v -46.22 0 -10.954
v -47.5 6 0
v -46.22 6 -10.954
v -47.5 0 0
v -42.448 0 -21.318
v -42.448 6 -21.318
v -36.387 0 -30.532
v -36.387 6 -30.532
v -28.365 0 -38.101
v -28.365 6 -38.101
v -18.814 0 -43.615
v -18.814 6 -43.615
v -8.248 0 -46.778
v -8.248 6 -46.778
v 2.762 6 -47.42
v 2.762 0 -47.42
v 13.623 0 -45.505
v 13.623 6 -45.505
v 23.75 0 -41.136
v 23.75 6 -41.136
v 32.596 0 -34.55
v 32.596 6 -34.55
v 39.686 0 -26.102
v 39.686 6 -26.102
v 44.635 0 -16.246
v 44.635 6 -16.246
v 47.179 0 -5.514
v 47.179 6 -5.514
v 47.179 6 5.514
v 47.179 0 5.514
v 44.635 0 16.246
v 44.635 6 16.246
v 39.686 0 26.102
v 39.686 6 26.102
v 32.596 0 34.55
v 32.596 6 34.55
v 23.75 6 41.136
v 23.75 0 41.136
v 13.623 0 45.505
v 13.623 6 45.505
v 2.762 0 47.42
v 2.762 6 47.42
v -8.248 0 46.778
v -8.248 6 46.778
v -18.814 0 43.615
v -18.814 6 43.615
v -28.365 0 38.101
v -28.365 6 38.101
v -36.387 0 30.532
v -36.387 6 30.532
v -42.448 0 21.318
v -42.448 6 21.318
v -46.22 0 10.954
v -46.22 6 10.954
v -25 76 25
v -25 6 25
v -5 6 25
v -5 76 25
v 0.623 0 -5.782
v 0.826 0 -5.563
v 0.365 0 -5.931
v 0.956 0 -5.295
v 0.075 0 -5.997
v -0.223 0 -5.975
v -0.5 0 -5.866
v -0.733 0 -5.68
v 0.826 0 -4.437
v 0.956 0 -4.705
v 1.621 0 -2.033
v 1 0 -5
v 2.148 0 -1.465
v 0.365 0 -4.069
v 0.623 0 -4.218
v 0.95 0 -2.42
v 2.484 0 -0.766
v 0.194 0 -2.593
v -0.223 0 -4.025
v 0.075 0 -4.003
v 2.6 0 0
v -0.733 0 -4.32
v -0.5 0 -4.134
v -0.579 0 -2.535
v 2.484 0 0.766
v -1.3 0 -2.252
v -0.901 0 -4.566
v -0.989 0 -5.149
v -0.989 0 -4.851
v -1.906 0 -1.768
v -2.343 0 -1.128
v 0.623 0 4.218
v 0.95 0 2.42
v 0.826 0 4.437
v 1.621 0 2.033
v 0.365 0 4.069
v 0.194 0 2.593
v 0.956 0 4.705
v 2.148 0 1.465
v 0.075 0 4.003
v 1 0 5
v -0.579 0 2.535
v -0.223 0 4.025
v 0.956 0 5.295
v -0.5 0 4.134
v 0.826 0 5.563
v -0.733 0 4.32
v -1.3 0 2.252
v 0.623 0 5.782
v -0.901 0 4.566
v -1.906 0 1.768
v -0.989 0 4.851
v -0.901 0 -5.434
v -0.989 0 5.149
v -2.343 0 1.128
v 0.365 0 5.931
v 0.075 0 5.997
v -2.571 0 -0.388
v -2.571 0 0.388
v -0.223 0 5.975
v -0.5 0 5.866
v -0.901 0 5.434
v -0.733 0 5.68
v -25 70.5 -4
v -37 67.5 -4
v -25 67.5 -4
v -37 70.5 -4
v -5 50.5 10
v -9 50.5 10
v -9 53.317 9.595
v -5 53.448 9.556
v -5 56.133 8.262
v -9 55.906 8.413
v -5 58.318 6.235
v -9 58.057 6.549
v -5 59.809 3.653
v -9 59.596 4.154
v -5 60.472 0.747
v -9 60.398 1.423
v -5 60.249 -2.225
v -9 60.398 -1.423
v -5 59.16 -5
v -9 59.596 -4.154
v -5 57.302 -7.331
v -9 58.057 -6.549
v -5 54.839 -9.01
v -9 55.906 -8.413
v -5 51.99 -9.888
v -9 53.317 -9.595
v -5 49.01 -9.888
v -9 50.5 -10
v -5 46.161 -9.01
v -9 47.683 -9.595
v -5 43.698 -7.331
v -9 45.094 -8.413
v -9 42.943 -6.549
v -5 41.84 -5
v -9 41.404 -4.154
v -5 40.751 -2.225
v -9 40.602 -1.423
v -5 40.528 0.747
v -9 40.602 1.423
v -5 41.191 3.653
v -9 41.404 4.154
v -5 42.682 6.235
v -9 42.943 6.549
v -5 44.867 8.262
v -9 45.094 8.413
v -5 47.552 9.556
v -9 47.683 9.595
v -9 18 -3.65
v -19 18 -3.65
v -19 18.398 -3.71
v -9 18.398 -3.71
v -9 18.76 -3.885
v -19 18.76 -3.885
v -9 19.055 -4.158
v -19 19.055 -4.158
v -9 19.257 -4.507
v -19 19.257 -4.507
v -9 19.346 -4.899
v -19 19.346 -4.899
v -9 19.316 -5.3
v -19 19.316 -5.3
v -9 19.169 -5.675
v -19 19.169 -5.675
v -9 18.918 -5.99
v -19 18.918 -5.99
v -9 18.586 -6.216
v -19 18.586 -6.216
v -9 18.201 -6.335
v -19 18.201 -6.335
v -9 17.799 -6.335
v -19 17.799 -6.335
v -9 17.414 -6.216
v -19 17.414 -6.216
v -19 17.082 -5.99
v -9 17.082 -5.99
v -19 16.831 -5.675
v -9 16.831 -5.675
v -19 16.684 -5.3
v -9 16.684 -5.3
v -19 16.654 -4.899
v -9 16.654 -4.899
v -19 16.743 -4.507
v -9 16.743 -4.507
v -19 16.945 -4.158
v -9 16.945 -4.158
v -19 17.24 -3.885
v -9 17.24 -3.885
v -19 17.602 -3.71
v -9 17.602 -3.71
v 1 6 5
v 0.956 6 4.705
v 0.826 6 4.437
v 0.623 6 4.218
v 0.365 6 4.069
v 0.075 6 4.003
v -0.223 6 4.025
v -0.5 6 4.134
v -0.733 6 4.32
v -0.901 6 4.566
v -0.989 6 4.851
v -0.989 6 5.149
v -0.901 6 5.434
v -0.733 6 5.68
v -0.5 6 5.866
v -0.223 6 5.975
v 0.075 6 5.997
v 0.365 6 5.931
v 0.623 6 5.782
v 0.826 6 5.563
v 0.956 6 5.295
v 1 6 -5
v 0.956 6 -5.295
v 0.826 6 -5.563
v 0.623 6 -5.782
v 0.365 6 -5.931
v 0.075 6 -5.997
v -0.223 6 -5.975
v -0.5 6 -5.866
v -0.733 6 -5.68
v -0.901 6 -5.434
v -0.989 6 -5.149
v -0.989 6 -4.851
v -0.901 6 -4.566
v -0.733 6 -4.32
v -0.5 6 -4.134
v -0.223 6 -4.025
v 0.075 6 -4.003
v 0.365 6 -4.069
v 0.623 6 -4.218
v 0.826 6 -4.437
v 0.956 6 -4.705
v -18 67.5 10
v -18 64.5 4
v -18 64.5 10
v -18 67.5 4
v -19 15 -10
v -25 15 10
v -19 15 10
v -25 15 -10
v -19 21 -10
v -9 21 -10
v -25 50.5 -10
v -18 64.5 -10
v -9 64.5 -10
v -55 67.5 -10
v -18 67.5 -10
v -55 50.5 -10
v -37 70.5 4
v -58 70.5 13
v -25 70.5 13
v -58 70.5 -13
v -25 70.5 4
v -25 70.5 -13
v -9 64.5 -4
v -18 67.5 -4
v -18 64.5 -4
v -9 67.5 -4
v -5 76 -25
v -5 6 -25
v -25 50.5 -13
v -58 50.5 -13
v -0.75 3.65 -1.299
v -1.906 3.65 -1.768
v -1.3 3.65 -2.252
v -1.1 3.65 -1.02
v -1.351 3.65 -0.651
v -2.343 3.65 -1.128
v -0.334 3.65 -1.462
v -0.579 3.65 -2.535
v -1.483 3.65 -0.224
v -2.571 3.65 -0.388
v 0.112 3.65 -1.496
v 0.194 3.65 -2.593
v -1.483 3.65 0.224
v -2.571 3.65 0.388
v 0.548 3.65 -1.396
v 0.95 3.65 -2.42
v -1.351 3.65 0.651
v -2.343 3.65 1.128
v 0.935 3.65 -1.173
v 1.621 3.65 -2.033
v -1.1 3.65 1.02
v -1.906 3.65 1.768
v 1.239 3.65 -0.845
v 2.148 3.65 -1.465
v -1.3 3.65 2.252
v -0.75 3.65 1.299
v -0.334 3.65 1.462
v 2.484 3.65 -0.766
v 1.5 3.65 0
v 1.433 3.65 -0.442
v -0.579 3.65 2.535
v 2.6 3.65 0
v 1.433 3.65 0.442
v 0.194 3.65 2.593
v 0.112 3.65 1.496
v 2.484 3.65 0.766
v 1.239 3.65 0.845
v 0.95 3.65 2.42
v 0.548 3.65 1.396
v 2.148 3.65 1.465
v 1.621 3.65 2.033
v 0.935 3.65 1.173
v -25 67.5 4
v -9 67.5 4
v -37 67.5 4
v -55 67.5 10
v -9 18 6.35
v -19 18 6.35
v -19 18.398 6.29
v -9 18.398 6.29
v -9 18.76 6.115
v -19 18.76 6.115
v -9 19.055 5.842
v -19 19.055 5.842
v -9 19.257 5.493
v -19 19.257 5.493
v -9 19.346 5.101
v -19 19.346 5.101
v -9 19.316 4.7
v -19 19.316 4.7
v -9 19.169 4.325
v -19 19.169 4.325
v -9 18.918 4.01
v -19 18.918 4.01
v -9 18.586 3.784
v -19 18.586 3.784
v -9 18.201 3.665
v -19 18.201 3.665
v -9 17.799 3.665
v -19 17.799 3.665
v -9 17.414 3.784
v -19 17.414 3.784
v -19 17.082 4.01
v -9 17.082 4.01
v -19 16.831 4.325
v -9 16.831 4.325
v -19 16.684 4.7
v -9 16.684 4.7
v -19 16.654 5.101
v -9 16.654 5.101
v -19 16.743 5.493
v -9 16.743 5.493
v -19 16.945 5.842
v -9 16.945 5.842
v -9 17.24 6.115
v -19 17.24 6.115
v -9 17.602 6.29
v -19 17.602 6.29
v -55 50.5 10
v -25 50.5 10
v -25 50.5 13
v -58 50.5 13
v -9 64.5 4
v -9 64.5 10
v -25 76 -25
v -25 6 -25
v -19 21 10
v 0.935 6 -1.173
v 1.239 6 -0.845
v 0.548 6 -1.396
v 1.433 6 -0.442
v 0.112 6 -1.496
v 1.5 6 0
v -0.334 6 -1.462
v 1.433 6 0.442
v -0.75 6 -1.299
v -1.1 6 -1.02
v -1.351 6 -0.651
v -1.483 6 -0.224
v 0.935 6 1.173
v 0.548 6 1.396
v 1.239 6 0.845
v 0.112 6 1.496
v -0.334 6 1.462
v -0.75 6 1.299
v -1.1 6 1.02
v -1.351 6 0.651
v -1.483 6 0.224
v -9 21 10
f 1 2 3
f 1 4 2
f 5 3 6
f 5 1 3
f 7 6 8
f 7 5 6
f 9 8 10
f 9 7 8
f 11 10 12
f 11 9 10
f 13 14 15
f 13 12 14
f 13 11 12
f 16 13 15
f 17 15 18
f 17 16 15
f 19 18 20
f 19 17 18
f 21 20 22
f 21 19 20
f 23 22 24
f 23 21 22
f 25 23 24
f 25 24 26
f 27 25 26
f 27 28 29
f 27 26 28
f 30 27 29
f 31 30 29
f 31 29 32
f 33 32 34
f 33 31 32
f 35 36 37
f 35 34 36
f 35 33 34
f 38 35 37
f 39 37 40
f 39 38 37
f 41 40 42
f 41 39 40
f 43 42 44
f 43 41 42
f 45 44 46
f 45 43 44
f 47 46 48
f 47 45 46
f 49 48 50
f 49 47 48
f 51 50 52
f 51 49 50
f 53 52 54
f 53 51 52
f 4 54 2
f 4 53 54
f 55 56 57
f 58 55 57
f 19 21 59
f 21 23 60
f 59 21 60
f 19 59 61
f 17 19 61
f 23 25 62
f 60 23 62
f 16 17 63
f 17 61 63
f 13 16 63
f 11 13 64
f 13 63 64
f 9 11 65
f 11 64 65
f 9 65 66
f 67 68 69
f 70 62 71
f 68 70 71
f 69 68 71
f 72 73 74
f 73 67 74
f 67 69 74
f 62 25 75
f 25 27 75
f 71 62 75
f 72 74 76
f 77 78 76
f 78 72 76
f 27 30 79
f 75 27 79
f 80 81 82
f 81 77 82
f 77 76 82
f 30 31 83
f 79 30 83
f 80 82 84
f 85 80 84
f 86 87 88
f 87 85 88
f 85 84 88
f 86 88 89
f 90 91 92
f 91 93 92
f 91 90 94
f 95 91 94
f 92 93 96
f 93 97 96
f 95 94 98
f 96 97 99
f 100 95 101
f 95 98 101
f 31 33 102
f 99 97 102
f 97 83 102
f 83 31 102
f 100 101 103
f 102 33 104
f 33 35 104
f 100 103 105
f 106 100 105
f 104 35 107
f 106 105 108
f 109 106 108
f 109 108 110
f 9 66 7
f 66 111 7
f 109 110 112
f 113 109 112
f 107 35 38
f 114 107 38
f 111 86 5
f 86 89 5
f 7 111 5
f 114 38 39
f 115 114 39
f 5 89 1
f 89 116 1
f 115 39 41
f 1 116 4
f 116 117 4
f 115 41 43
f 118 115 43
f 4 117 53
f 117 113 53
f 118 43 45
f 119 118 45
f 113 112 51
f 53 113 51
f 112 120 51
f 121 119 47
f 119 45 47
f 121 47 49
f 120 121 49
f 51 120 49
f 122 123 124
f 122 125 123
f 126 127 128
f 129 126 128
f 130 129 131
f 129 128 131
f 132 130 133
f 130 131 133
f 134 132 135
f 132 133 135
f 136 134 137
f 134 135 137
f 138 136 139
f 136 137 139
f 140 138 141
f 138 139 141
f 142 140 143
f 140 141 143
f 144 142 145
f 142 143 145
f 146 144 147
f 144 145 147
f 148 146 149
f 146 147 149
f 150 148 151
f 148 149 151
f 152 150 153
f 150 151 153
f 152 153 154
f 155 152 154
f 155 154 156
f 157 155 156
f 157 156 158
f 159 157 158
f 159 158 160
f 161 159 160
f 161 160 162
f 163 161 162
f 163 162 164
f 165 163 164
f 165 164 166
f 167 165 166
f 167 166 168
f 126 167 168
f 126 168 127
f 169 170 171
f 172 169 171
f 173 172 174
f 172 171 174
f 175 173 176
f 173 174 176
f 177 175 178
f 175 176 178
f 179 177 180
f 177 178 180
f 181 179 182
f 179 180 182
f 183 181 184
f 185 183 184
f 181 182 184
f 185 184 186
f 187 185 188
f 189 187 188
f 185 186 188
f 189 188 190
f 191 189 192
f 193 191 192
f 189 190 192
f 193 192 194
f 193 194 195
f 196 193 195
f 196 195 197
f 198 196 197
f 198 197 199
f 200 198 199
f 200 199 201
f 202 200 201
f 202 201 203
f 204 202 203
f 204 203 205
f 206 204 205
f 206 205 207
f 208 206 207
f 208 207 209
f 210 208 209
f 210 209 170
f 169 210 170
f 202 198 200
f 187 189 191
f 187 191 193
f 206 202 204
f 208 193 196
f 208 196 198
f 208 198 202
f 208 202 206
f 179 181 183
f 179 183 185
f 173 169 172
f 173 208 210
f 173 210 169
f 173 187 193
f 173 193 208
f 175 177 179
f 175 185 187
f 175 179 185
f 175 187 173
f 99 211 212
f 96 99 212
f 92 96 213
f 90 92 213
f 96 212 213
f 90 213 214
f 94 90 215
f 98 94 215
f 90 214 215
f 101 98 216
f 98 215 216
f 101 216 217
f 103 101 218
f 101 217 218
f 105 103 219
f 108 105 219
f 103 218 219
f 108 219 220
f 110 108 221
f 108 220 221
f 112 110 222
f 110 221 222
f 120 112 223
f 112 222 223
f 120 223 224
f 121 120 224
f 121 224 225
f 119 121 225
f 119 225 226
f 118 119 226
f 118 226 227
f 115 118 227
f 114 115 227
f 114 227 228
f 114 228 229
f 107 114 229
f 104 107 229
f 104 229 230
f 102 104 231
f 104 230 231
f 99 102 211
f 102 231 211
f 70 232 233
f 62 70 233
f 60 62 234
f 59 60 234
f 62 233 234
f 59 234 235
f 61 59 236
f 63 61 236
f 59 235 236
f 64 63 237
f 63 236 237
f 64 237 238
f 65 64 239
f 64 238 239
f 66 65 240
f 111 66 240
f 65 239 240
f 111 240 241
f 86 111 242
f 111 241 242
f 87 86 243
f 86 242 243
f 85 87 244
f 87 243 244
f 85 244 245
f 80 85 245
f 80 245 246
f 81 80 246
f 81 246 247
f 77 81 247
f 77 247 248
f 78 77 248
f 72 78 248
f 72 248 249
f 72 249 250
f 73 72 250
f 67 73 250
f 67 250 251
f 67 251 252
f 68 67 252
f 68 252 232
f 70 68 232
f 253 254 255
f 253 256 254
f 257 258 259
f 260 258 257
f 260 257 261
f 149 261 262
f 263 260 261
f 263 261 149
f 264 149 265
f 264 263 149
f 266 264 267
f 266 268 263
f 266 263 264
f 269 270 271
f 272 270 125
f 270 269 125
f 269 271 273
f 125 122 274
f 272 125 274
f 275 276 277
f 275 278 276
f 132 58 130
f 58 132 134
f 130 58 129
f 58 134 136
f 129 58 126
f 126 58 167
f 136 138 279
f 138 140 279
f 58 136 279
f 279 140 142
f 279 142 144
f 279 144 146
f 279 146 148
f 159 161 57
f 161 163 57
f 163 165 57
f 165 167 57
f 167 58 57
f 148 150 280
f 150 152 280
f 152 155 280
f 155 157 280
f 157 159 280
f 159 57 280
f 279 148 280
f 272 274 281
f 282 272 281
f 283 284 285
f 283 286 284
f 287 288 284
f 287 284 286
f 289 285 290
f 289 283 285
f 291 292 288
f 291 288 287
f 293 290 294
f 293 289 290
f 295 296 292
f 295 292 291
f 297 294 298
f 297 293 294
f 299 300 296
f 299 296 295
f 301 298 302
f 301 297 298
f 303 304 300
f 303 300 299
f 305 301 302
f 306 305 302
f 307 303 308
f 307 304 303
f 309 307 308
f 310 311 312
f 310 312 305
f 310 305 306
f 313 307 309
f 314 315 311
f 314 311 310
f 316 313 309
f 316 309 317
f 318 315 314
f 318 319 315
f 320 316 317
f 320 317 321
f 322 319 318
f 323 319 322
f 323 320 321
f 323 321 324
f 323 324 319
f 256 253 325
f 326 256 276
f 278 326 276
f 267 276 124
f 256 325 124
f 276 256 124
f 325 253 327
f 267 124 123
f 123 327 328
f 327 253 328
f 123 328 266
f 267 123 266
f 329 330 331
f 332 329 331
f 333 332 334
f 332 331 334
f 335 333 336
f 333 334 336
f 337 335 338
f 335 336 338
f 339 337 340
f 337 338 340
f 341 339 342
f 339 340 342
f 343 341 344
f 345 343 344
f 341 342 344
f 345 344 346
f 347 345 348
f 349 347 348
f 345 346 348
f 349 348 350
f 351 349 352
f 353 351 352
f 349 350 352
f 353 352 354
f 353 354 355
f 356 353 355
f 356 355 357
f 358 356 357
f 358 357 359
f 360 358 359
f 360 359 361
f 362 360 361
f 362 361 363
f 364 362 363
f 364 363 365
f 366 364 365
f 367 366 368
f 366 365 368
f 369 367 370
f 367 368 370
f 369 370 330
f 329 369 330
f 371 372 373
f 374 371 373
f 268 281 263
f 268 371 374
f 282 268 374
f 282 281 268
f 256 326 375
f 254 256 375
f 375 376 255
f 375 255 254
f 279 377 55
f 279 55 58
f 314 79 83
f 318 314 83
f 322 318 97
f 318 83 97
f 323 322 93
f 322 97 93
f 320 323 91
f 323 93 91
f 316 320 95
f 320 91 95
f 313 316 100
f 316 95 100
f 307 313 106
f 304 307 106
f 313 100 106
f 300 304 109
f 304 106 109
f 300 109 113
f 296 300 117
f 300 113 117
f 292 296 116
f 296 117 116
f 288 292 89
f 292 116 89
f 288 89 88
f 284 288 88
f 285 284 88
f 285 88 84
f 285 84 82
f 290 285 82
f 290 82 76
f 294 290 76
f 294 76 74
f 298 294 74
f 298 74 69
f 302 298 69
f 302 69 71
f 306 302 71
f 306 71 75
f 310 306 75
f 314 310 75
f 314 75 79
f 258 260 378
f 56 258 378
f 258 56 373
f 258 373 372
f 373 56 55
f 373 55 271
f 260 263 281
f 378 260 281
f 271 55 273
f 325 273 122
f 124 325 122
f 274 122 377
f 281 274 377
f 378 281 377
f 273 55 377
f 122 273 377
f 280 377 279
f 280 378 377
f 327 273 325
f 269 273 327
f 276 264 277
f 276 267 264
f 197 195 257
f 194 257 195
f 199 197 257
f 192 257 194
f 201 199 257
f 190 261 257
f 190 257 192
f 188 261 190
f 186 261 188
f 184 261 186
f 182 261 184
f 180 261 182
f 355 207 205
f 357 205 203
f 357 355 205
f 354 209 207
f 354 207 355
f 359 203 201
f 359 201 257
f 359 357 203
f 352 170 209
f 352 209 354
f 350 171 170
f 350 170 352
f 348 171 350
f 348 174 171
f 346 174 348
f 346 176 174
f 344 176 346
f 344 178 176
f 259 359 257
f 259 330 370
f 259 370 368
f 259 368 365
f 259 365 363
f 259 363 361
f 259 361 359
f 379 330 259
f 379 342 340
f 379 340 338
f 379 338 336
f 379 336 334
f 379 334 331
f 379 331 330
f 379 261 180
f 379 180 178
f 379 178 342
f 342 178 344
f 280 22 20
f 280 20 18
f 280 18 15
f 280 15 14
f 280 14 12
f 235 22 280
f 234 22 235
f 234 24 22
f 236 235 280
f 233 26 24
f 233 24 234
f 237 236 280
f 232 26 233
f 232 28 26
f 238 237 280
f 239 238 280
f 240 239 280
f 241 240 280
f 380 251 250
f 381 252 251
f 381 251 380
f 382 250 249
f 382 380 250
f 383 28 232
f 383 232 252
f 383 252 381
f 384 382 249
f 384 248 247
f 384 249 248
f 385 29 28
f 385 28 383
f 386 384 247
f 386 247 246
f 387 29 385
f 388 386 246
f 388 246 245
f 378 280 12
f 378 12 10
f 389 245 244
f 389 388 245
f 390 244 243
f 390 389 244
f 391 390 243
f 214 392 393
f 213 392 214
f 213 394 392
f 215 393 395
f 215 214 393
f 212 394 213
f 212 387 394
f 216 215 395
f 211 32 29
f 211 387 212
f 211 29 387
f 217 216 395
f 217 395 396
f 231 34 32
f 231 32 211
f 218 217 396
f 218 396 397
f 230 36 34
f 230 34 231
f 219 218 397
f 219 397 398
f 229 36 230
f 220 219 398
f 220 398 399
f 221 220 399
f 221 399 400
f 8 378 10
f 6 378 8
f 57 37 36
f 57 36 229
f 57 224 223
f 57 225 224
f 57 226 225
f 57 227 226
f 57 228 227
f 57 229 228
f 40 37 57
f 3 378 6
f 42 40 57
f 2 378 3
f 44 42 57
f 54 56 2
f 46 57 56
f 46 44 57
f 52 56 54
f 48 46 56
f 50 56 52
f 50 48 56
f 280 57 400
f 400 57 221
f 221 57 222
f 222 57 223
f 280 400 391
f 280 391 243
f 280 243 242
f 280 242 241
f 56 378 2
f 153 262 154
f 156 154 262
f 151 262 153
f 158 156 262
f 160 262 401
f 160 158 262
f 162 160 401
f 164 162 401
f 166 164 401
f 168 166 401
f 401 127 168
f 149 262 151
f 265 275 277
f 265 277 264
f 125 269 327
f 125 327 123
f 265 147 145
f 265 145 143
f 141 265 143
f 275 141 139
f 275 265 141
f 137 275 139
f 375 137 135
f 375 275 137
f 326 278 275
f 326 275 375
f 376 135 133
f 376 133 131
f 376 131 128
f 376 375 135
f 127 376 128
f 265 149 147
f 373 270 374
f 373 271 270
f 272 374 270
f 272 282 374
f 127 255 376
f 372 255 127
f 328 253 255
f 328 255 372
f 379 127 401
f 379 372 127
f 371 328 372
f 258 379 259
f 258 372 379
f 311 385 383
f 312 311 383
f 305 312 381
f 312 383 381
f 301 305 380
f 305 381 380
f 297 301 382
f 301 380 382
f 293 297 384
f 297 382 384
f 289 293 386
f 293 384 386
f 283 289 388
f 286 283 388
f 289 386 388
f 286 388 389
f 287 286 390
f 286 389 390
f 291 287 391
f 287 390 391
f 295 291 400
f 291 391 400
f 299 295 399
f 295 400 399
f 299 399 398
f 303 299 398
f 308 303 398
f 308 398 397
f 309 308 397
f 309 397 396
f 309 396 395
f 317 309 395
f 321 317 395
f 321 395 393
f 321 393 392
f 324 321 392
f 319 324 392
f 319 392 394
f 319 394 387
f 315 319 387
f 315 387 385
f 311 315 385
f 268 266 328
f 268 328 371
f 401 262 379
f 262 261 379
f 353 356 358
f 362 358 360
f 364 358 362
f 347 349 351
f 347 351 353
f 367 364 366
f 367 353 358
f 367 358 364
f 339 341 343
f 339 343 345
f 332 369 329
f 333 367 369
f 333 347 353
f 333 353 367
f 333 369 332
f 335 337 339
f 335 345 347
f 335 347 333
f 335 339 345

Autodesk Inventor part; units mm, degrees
ref_plane "YZ Plane" through (0, 0, 0) normal (1, 0, 0) x (0, 1, 0)
ref_plane "XZ Plane" through (0, 0, 0) normal (0, 1, 0) x (-1, 0, 0)
ref_plane "XY Plane" through (0, 0, 0) normal (0, 0, 1) x (1, 0, 0)
sketch "Sketch1" plane through (0, 0, 0) normal (0, 1, 0) x (-1, 0, 0)
  circle A0 centre (0, 0) radius 47.5
  dimension "d0" = 95
extrude "Extrusion1" add sketch "Sketch1" along normal blind 6
sketch "Sketch2" plane through (0, 6, 0) normal (0, 1, 0) x (1, 0, 0)
  circle A0 centre (0, 0) radius 10
  circle A1 centre (0, 5) radius 1
  circle A2 centre (0, -5) radius 1
  dimension "d3" = 20
  dimension "d4" = 2
  dimension "d5" = 2
extrude "Extrusion2" cut sketch "Sketch2" against normal blind 23.4625 contours A1 | A2
sketch "Sketch4" plane through (0, 6, 0) normal (0, 1, 0) x (1, 0, 0)
  line L0 (0, 0) -> (-10, 0)
  line L1 (-10, 0) -> (-10, 25)
  line L2 (-10, 25) -> (0, 25)
  line L3 (0, 25) -> (0, 0)
  line L4 (0, 0) -> (-5, 0)
  line L5 (-5, 0) -> (-5, 25)
  line L6 (-5, 25) -> (0, 25)
  line L7 (0, 25) -> (0, 0)
  line L8 (-5, 25) -> (-20, 25)
  line L9 (-20, 25) -> (-20, -25)
  line L10 (-20, -25) -> (-5, -25)
  line L11 (-5, -25) -> (-5, 25)
  line L12 (-5, 25) -> (-25, 25)
  line L13 (-25, 25) -> (-25, -25)
  line L14 (-25, -25) -> (-5, -25)
  line L15 (-5, -25) -> (-5, 25)
  dimension "d9" = 10
  dimension "d10" = 25
  dimension "d11" = 15
  dimension "d12" = 50
  dimension "d13" = 20
extrude "Extrusion3" add sketch "Sketch4" along normal blind 70 contours L11 L10 L9 L8 L1 L0 | L0 L1 L2 L5 | L14 L13 L12 L9
sketch "Sketch5" plane through (-25, 6, -25) normal (-1, 0, 0) x (0, 0, 1)
  line L0 (0, 0) -> (0, 70) projected
  line L1 (50, 0) -> (50, 70) projected
  line L2 (0, 70) -> (50, 70)
  line L3 (50, 70) -> (50, 0)
  line L4 (50, 0) -> (0, 0)
  line L5 (0, 0) -> (0, 70)
  line L6 (50, 70) -> (0, 70) projected
  line L7 (72.5, 0) -> (-22.5, 0) projected
  line L8 (0, 70) -> (25, 70)
  line L9 (25, 70) -> (25, 0)
  line L10 (25, 0) -> (0, 0)
  line L11 (0, 0) -> (0, 70)
  line L12 (25, 35) -> (15, 35)
  line L13 (15, 35) -> (15, 15)
  line L14 (15, 15) -> (25, 15)
  line L15 (25, 15) -> (25, 35)
  line L16 (15, 35) -> (25, 35)
  line L17 (25, 35) -> (25, 55)
  line L18 (25, 55) -> (15, 55)
  line L19 (15, 55) -> (15, 35)
  line L20 (15, 15) -> (35, 15)
  line L21 (35, 15) -> (35, 55)
  line L22 (35, 55) -> (15, 55)
  line L23 (15, 55) -> (15, 15)
  line L24 (15, 15) -> (35, 15)
  line L25 (35, 15) -> (35, 55.5)
  line L26 (35, 55.5) -> (15, 55.5)
  line L27 (15, 55.5) -> (15, 15)
  point P0 (25, -6)
  dimension "d16" = 10
  dimension "d17" = 20
  dimension "d18" = 20
  dimension "d19" = 20
  dimension "d20" = 40.5
extrude "Extrusion4" cut sketch "Sketch5" against normal blind 16 contours L14 L13 L12 L9 | L9 L22 L21 L20 | L26 L25 L22 L9 | L9 L18 L27 L26 | L12 L19 L18 L9
sketch "Sketch6" plane through (-25, 6, -25) normal (-1, 0, 0) x (0, 0, 1)
  line L0 (35, 15) -> (15, 15) projected
  line L1 (15, 15) -> (35, 15)
  line L2 (35, 15) -> (35, 9)
  line L3 (35, 9) -> (15, 9)
  line L4 (15, 9) -> (15, 15)
  line L5 (15, 55.5) -> (35, 55.5) projected
  line L6 (15, 55.5) -> (35, 55.5)
  line L7 (35, 55.5) -> (35, 61.5)
  line L8 (35, 61.5) -> (15, 61.5)
  line L9 (15, 61.5) -> (15, 55.5)
  point P0 (25, -6)
  dimension "d23" = 6
  dimension "d24" = 6
extrude "Extrusion5" cut sketch "Sketch6" against normal blind 6
sketch "Sketch7" plane through (-19, 6, -25) normal (-1, 0, 0) x (0, 0, 1)
  line L0 (35, 9) -> (15, 9) projected
  line L1 (35, 61.5) -> (35, 9) projected
  line L2 (15, 9) -> (35, 9)
  line L3 (35, 9) -> (35, 11.6)
  line L4 (35, 11.6) -> (15, 11.6)
  line L5 (15, 11.6) -> (15, 9)
  line L6 (15, 55.5) -> (15, 61.5) projected
  line L7 (35, 61.5) -> (35, 55.5) projected
  line L8 (15, 61.5) -> (35, 61.5)
  line L9 (35, 61.5) -> (35, 58.5)
  line L10 (35, 58.5) -> (15, 58.5)
  line L11 (15, 58.5) -> (15, 61.5)
  line L12 (15, 9) -> (15, 61.5) projected
  line L13 (15, 9) -> (35, 9)
  line L14 (35, 9) -> (35, 12)
  line L15 (35, 12) -> (15, 12)
  line L16 (15, 12) -> (15, 9)
  line L17 (35, 15) -> (15, 15) projected
  line L18 (25, 15) -> (20, 15)
  line L19 (20, 15) -> (20, 12)
  line L20 (20, 12) -> (25, 12)
  line L21 (25, 12) -> (25, 15)
  line L22 (25, 15) -> (30, 15)
  line L23 (30, 15) -> (30, 12)
  line L24 (30, 12) -> (25, 12)
  line L25 (25, 12) -> (25, 15)
  line L26 (15, 61.5) -> (35, 61.5) projected
  line L27 (25, 58.5) -> (20, 58.5)
  line L28 (20, 58.5) -> (20, 61.5)
  line L29 (20, 61.5) -> (25, 61.5)
  line L30 (25, 61.5) -> (25, 58.5)
  line L31 (25, 58.5) -> (30, 58.5)
  line L32 (30, 58.5) -> (30, 61.5)
  line L33 (30, 61.5) -> (25, 61.5)
  line L34 (25, 61.5) -> (25, 58.5)
  circle A0 centre (20, 12) radius 1.35
  circle A1 centre (30, 12) radius 1.35
  circle A2 centre (20, 58.5) radius 1.35
  circle A3 centre (30, 58.5) radius 1.35
  point P0 (25, -6)
  dimension "d27" = 2.6
  dimension "d28" = 3
  dimension "d29" = 3
  dimension "d30" = 5
  dimension "d31" = 5
  dimension "d32" = 2.7
  dimension "d33" = 2.7
  dimension "d34" = 2.7
  dimension "d35" = 2.7
extrude "Extrusion6" cut sketch "Sketch7" against normal blind 10 contours A1 L4 | L4 A1 L15 | A0 L15 L4 | L4 A0 | L15 L23 A1 | A0 L19 L15 | L15 A1 L23 | L15 L19 A0 | A3 L10 | L10 L32 A3 | A2 L28 L10 | L10 A2 | L10 A3 L32 | L28 A2 L10
thread "Thread1" size "M3x0.5" class "6H" standard "ANSI Metric M Profile" full length
thread "Thread2" size "M3x0.5" class "6H" standard "ANSI Metric M Profile" full length
thread "Thread3" size "M3x0.5" class "6H" standard "ANSI Metric M Profile" full length
thread "Thread4" size "M3x0.5" class "6H" standard "ANSI Metric M Profile" full length
sketch "Sketch8" plane through (-9, 6, -25) normal (-1, 0, 0) x (0, 0, 1)
  line L0 (15, 9) -> (15, 61.5) projected
  line L1 (35, 55.5) -> (35, 15) projected
  line L2 (15, 61.5) -> (35, 61.5)
  line L3 (35, 61.5) -> (35, 44.5)
  line L4 (35, 44.5) -> (15, 44.5)
  line L5 (15, 44.5) -> (15, 61.5)
  circle A0 centre (25, 44.5) radius 10
  point P0 (25, -6)
  dimension "d46" = 17
  dimension "d47" = 20
extrude "Extrusion7" cut sketch "Sketch8" against normal blind 15.4 contours A0 L4 | L4 A0
sketch "Sketch9" plane through (0, 6, 0) normal (0, 1, 0) x (1, 0, 0)
  circle A0 centre (0, 0) radius 1.5
  dimension "d50" = 3
extrude "Extrusion8" cut sketch "Sketch9" against normal blind 15.4
sketch "Sketch10" plane through (0, 0, 0) normal (0, -1, 0) x (1, 0, 0)
  circle A0 centre (0, 0) radius 2.6
  dimension "d53" = 5.2
extrude "Extrusion9" cut sketch "Sketch10" against normal blind 3.65
sketch "Sketch11" plane through (-19, 6, -25) normal (-1, 0, 0) x (0, 0, 1)
  line L0 (15, 55.5) -> (15, 61.5) projected
  line L1 (35, 55.5) -> (35, 44.5) projected
  line L2 (15, 61.5) -> (35, 61.5)
  line L3 (35, 61.5) -> (35, 55.5)
  line L4 (35, 55.5) -> (15, 55.5)
  line L5 (15, 55.5) -> (15, 61.5)
  point P0 (25, -6)
extrude "Extrusion10" cut sketch "Sketch11" against normal blind 10
sketch "Sketch12" plane through (-9, 6, -25) normal (-1, 0, 0) x (0, 0, 1)
  line L0 (15, 61.5) -> (35, 61.5) projected
  line L1 (35, 61.5) -> (35, 9) projected
  line L2 (15, 61.5) -> (35, 61.5)
  line L3 (35, 61.5) -> (35, 58.5)
  line L4 (35, 58.5) -> (15, 58.5)
  line L5 (15, 58.5) -> (15, 61.5)
  line L6 (15, 61.5) -> (21, 61.5)
  line L7 (21, 61.5) -> (21, 58.5)
  line L8 (21, 58.5) -> (15, 58.5)
  line L9 (15, 58.5) -> (15, 61.5)
  line L10 (15, 61.5) -> (35, 61.5) projected
  line L11 (35, 61.5) -> (29, 61.5)
  line L12 (29, 61.5) -> (29, 58.5)
  line L13 (29, 58.5) -> (35, 58.5)
  line L14 (35, 58.5) -> (35, 61.5)
  point P0 (25, -6)
  dimension "d58" = 3
  dimension "d59" = 6
  dimension "d60" = 6
extrude "Extrusion11" add sketch "Sketch12" along normal blind 12 contours L0 L7 L4 L5 | L0 L1 L4 L12
sketch "Sketch13" plane through (-25, 6, -25) normal (-1, 0, 0) x (0, 0, 1)
  line L0 (15, 61.5) -> (35, 61.5)
  line L1 (35, 61.5) -> (35, 64.5)
  line L2 (35, 64.5) -> (15, 64.5)
  line L3 (15, 64.5) -> (15, 61.5)
  line L4 (15, 64.5) -> (12, 64.5)
  line L5 (12, 64.5) -> (12, 44.5)
  line L6 (12, 44.5) -> (15, 44.5)
  line L7 (15, 44.5) -> (15, 64.5)
  line L8 (35, 64.5) -> (38, 64.5)
  line L9 (38, 64.5) -> (38, 44.5)
  line L10 (38, 44.5) -> (35, 44.5)
  line L11 (35, 44.5) -> (35, 64.5)
  point P0 (25, -6)
  dimension "d63" = 20
  dimension "d64" = 3
  dimension "d65" = 3
  dimension "d66" = 20
  dimension "d67" = 3
extrude "Extrusion12" add sketch "Sketch13" along normal blind 30
sketch "Sketch16" plane through (-55, 6, -25) normal (-1, 0, 0) x (0, 0, 1)
  line L0 (12, 44.5) -> (15, 44.5) projected
  line L1 (38, 64.5) -> (12, 64.5) projected
  line L2 (12, 44.5) -> (15, 44.5)
  line L3 (15, 44.5) -> (15, 64.5)
  line L4 (15, 64.5) -> (12, 64.5)
  line L5 (12, 64.5) -> (12, 44.5)
  line L6 (38, 44.5) -> (38, 64.5) projected
  line L7 (12, 64.5) -> (38, 64.5)
  line L8 (38, 64.5) -> (38, 61.5)
  line L9 (38, 61.5) -> (12, 61.5)
  line L10 (12, 61.5) -> (12, 64.5)
  line L11 (35, 44.5) -> (38, 44.5) projected
  line L12 (38, 64.5) -> (35, 64.5)
  line L13 (35, 64.5) -> (35, 44.5)
  line L14 (35, 44.5) -> (38, 44.5)
  line L15 (38, 44.5) -> (38, 64.5)
  point P0 (25, -6)
  point P1 (15, 61.5)
  point P2 (35, 61.5)
  dimension "d70" = 3
  dimension "d71" = 3
extrude "Extrusion13" add sketch "Sketch16" along normal blind 3
sketch "Sketch17" plane through (-19, 21, -10) normal (0, 0, 1) x (1, 0, 0)
  line L0 (-39, 46.5) -> (-2, 46.5) projected
  line L1 (-6, 29.5) -> (-39, 29.5) projected
  line L2 (-39, 46.5) -> (-36, 46.5)
  line L3 (-36, 46.5) -> (-36, 29.5)
  line L4 (-36, 29.5) -> (-39, 29.5)
  line L5 (-39, 29.5) -> (-39, 46.5)
  point P0 (19, -21)
  dimension "d74" = 3
extrude "Extrusion14" add sketch "Sketch17" along normal blind 20
sketch "Sketch19" plane through (-25, 70.5, 13) normal (0, 1, 0) x (1, 0, 0)
  line L0 (0, 26) -> (-33, 26) projected
  line L1 (0, 26) -> (-10.9488, 26)
  line L2 (-10.9488, 26) -> (-10.9488, 13)
  line L3 (-10.9488, 13) -> (0, 13)
  line L4 (0, 13) -> (0, 26)
  line L5 (0, 13) -> (-12, 13)
  line L6 (-12, 13) -> (-12, 17)
  line L7 (-12, 17) -> (0, 17)
  line L8 (0, 17) -> (0, 13)
  line L9 (0, 26) -> (0, 0) projected
  line L10 (-12, 13) -> (0, 13)
  line L11 (0, 13) -> (0, 9)
  line L12 (0, 9) -> (-12, 9)
  line L13 (-12, 9) -> (-12, 13)
  point P0 (25, 13)
  dimension "d77" = 12
  dimension "d78" = 4
  dimension "d79" = 4
extrude "Extrusion15" cut sketch "Sketch19" against normal blind 4 contours L4 L3 L2 L7 | L2 L5 L6 L7 | L9 L12 L13 L5 L3
sketch "Sketch20" plane through (-21, 6, -25) normal (-1, 0, 0) x (0, 0, 1)
  line L0 (15, 58.5) -> (21, 58.5) projected
  line L1 (15, 61.5) -> (21, 61.5) projected
  line L2 (15, 58.5) -> (21, 58.5)
  line L3 (21, 58.5) -> (21, 61.5)
  line L4 (21, 61.5) -> (15, 61.5)
  line L5 (15, 61.5) -> (15, 58.5)
  line L6 (29, 61.5) -> (35, 61.5) projected
  line L7 (29, 61.5) -> (35, 61.5)
  line L8 (35, 61.5) -> (35, 58.5)
  line L9 (35, 58.5) -> (29, 58.5)
  line L10 (29, 58.5) -> (29, 61.5)
  point P0 (25, -6)
extrude "Extrusion16" cut sketch "Sketch20" against normal blind 3
properties part number "Base top w servo housing"
